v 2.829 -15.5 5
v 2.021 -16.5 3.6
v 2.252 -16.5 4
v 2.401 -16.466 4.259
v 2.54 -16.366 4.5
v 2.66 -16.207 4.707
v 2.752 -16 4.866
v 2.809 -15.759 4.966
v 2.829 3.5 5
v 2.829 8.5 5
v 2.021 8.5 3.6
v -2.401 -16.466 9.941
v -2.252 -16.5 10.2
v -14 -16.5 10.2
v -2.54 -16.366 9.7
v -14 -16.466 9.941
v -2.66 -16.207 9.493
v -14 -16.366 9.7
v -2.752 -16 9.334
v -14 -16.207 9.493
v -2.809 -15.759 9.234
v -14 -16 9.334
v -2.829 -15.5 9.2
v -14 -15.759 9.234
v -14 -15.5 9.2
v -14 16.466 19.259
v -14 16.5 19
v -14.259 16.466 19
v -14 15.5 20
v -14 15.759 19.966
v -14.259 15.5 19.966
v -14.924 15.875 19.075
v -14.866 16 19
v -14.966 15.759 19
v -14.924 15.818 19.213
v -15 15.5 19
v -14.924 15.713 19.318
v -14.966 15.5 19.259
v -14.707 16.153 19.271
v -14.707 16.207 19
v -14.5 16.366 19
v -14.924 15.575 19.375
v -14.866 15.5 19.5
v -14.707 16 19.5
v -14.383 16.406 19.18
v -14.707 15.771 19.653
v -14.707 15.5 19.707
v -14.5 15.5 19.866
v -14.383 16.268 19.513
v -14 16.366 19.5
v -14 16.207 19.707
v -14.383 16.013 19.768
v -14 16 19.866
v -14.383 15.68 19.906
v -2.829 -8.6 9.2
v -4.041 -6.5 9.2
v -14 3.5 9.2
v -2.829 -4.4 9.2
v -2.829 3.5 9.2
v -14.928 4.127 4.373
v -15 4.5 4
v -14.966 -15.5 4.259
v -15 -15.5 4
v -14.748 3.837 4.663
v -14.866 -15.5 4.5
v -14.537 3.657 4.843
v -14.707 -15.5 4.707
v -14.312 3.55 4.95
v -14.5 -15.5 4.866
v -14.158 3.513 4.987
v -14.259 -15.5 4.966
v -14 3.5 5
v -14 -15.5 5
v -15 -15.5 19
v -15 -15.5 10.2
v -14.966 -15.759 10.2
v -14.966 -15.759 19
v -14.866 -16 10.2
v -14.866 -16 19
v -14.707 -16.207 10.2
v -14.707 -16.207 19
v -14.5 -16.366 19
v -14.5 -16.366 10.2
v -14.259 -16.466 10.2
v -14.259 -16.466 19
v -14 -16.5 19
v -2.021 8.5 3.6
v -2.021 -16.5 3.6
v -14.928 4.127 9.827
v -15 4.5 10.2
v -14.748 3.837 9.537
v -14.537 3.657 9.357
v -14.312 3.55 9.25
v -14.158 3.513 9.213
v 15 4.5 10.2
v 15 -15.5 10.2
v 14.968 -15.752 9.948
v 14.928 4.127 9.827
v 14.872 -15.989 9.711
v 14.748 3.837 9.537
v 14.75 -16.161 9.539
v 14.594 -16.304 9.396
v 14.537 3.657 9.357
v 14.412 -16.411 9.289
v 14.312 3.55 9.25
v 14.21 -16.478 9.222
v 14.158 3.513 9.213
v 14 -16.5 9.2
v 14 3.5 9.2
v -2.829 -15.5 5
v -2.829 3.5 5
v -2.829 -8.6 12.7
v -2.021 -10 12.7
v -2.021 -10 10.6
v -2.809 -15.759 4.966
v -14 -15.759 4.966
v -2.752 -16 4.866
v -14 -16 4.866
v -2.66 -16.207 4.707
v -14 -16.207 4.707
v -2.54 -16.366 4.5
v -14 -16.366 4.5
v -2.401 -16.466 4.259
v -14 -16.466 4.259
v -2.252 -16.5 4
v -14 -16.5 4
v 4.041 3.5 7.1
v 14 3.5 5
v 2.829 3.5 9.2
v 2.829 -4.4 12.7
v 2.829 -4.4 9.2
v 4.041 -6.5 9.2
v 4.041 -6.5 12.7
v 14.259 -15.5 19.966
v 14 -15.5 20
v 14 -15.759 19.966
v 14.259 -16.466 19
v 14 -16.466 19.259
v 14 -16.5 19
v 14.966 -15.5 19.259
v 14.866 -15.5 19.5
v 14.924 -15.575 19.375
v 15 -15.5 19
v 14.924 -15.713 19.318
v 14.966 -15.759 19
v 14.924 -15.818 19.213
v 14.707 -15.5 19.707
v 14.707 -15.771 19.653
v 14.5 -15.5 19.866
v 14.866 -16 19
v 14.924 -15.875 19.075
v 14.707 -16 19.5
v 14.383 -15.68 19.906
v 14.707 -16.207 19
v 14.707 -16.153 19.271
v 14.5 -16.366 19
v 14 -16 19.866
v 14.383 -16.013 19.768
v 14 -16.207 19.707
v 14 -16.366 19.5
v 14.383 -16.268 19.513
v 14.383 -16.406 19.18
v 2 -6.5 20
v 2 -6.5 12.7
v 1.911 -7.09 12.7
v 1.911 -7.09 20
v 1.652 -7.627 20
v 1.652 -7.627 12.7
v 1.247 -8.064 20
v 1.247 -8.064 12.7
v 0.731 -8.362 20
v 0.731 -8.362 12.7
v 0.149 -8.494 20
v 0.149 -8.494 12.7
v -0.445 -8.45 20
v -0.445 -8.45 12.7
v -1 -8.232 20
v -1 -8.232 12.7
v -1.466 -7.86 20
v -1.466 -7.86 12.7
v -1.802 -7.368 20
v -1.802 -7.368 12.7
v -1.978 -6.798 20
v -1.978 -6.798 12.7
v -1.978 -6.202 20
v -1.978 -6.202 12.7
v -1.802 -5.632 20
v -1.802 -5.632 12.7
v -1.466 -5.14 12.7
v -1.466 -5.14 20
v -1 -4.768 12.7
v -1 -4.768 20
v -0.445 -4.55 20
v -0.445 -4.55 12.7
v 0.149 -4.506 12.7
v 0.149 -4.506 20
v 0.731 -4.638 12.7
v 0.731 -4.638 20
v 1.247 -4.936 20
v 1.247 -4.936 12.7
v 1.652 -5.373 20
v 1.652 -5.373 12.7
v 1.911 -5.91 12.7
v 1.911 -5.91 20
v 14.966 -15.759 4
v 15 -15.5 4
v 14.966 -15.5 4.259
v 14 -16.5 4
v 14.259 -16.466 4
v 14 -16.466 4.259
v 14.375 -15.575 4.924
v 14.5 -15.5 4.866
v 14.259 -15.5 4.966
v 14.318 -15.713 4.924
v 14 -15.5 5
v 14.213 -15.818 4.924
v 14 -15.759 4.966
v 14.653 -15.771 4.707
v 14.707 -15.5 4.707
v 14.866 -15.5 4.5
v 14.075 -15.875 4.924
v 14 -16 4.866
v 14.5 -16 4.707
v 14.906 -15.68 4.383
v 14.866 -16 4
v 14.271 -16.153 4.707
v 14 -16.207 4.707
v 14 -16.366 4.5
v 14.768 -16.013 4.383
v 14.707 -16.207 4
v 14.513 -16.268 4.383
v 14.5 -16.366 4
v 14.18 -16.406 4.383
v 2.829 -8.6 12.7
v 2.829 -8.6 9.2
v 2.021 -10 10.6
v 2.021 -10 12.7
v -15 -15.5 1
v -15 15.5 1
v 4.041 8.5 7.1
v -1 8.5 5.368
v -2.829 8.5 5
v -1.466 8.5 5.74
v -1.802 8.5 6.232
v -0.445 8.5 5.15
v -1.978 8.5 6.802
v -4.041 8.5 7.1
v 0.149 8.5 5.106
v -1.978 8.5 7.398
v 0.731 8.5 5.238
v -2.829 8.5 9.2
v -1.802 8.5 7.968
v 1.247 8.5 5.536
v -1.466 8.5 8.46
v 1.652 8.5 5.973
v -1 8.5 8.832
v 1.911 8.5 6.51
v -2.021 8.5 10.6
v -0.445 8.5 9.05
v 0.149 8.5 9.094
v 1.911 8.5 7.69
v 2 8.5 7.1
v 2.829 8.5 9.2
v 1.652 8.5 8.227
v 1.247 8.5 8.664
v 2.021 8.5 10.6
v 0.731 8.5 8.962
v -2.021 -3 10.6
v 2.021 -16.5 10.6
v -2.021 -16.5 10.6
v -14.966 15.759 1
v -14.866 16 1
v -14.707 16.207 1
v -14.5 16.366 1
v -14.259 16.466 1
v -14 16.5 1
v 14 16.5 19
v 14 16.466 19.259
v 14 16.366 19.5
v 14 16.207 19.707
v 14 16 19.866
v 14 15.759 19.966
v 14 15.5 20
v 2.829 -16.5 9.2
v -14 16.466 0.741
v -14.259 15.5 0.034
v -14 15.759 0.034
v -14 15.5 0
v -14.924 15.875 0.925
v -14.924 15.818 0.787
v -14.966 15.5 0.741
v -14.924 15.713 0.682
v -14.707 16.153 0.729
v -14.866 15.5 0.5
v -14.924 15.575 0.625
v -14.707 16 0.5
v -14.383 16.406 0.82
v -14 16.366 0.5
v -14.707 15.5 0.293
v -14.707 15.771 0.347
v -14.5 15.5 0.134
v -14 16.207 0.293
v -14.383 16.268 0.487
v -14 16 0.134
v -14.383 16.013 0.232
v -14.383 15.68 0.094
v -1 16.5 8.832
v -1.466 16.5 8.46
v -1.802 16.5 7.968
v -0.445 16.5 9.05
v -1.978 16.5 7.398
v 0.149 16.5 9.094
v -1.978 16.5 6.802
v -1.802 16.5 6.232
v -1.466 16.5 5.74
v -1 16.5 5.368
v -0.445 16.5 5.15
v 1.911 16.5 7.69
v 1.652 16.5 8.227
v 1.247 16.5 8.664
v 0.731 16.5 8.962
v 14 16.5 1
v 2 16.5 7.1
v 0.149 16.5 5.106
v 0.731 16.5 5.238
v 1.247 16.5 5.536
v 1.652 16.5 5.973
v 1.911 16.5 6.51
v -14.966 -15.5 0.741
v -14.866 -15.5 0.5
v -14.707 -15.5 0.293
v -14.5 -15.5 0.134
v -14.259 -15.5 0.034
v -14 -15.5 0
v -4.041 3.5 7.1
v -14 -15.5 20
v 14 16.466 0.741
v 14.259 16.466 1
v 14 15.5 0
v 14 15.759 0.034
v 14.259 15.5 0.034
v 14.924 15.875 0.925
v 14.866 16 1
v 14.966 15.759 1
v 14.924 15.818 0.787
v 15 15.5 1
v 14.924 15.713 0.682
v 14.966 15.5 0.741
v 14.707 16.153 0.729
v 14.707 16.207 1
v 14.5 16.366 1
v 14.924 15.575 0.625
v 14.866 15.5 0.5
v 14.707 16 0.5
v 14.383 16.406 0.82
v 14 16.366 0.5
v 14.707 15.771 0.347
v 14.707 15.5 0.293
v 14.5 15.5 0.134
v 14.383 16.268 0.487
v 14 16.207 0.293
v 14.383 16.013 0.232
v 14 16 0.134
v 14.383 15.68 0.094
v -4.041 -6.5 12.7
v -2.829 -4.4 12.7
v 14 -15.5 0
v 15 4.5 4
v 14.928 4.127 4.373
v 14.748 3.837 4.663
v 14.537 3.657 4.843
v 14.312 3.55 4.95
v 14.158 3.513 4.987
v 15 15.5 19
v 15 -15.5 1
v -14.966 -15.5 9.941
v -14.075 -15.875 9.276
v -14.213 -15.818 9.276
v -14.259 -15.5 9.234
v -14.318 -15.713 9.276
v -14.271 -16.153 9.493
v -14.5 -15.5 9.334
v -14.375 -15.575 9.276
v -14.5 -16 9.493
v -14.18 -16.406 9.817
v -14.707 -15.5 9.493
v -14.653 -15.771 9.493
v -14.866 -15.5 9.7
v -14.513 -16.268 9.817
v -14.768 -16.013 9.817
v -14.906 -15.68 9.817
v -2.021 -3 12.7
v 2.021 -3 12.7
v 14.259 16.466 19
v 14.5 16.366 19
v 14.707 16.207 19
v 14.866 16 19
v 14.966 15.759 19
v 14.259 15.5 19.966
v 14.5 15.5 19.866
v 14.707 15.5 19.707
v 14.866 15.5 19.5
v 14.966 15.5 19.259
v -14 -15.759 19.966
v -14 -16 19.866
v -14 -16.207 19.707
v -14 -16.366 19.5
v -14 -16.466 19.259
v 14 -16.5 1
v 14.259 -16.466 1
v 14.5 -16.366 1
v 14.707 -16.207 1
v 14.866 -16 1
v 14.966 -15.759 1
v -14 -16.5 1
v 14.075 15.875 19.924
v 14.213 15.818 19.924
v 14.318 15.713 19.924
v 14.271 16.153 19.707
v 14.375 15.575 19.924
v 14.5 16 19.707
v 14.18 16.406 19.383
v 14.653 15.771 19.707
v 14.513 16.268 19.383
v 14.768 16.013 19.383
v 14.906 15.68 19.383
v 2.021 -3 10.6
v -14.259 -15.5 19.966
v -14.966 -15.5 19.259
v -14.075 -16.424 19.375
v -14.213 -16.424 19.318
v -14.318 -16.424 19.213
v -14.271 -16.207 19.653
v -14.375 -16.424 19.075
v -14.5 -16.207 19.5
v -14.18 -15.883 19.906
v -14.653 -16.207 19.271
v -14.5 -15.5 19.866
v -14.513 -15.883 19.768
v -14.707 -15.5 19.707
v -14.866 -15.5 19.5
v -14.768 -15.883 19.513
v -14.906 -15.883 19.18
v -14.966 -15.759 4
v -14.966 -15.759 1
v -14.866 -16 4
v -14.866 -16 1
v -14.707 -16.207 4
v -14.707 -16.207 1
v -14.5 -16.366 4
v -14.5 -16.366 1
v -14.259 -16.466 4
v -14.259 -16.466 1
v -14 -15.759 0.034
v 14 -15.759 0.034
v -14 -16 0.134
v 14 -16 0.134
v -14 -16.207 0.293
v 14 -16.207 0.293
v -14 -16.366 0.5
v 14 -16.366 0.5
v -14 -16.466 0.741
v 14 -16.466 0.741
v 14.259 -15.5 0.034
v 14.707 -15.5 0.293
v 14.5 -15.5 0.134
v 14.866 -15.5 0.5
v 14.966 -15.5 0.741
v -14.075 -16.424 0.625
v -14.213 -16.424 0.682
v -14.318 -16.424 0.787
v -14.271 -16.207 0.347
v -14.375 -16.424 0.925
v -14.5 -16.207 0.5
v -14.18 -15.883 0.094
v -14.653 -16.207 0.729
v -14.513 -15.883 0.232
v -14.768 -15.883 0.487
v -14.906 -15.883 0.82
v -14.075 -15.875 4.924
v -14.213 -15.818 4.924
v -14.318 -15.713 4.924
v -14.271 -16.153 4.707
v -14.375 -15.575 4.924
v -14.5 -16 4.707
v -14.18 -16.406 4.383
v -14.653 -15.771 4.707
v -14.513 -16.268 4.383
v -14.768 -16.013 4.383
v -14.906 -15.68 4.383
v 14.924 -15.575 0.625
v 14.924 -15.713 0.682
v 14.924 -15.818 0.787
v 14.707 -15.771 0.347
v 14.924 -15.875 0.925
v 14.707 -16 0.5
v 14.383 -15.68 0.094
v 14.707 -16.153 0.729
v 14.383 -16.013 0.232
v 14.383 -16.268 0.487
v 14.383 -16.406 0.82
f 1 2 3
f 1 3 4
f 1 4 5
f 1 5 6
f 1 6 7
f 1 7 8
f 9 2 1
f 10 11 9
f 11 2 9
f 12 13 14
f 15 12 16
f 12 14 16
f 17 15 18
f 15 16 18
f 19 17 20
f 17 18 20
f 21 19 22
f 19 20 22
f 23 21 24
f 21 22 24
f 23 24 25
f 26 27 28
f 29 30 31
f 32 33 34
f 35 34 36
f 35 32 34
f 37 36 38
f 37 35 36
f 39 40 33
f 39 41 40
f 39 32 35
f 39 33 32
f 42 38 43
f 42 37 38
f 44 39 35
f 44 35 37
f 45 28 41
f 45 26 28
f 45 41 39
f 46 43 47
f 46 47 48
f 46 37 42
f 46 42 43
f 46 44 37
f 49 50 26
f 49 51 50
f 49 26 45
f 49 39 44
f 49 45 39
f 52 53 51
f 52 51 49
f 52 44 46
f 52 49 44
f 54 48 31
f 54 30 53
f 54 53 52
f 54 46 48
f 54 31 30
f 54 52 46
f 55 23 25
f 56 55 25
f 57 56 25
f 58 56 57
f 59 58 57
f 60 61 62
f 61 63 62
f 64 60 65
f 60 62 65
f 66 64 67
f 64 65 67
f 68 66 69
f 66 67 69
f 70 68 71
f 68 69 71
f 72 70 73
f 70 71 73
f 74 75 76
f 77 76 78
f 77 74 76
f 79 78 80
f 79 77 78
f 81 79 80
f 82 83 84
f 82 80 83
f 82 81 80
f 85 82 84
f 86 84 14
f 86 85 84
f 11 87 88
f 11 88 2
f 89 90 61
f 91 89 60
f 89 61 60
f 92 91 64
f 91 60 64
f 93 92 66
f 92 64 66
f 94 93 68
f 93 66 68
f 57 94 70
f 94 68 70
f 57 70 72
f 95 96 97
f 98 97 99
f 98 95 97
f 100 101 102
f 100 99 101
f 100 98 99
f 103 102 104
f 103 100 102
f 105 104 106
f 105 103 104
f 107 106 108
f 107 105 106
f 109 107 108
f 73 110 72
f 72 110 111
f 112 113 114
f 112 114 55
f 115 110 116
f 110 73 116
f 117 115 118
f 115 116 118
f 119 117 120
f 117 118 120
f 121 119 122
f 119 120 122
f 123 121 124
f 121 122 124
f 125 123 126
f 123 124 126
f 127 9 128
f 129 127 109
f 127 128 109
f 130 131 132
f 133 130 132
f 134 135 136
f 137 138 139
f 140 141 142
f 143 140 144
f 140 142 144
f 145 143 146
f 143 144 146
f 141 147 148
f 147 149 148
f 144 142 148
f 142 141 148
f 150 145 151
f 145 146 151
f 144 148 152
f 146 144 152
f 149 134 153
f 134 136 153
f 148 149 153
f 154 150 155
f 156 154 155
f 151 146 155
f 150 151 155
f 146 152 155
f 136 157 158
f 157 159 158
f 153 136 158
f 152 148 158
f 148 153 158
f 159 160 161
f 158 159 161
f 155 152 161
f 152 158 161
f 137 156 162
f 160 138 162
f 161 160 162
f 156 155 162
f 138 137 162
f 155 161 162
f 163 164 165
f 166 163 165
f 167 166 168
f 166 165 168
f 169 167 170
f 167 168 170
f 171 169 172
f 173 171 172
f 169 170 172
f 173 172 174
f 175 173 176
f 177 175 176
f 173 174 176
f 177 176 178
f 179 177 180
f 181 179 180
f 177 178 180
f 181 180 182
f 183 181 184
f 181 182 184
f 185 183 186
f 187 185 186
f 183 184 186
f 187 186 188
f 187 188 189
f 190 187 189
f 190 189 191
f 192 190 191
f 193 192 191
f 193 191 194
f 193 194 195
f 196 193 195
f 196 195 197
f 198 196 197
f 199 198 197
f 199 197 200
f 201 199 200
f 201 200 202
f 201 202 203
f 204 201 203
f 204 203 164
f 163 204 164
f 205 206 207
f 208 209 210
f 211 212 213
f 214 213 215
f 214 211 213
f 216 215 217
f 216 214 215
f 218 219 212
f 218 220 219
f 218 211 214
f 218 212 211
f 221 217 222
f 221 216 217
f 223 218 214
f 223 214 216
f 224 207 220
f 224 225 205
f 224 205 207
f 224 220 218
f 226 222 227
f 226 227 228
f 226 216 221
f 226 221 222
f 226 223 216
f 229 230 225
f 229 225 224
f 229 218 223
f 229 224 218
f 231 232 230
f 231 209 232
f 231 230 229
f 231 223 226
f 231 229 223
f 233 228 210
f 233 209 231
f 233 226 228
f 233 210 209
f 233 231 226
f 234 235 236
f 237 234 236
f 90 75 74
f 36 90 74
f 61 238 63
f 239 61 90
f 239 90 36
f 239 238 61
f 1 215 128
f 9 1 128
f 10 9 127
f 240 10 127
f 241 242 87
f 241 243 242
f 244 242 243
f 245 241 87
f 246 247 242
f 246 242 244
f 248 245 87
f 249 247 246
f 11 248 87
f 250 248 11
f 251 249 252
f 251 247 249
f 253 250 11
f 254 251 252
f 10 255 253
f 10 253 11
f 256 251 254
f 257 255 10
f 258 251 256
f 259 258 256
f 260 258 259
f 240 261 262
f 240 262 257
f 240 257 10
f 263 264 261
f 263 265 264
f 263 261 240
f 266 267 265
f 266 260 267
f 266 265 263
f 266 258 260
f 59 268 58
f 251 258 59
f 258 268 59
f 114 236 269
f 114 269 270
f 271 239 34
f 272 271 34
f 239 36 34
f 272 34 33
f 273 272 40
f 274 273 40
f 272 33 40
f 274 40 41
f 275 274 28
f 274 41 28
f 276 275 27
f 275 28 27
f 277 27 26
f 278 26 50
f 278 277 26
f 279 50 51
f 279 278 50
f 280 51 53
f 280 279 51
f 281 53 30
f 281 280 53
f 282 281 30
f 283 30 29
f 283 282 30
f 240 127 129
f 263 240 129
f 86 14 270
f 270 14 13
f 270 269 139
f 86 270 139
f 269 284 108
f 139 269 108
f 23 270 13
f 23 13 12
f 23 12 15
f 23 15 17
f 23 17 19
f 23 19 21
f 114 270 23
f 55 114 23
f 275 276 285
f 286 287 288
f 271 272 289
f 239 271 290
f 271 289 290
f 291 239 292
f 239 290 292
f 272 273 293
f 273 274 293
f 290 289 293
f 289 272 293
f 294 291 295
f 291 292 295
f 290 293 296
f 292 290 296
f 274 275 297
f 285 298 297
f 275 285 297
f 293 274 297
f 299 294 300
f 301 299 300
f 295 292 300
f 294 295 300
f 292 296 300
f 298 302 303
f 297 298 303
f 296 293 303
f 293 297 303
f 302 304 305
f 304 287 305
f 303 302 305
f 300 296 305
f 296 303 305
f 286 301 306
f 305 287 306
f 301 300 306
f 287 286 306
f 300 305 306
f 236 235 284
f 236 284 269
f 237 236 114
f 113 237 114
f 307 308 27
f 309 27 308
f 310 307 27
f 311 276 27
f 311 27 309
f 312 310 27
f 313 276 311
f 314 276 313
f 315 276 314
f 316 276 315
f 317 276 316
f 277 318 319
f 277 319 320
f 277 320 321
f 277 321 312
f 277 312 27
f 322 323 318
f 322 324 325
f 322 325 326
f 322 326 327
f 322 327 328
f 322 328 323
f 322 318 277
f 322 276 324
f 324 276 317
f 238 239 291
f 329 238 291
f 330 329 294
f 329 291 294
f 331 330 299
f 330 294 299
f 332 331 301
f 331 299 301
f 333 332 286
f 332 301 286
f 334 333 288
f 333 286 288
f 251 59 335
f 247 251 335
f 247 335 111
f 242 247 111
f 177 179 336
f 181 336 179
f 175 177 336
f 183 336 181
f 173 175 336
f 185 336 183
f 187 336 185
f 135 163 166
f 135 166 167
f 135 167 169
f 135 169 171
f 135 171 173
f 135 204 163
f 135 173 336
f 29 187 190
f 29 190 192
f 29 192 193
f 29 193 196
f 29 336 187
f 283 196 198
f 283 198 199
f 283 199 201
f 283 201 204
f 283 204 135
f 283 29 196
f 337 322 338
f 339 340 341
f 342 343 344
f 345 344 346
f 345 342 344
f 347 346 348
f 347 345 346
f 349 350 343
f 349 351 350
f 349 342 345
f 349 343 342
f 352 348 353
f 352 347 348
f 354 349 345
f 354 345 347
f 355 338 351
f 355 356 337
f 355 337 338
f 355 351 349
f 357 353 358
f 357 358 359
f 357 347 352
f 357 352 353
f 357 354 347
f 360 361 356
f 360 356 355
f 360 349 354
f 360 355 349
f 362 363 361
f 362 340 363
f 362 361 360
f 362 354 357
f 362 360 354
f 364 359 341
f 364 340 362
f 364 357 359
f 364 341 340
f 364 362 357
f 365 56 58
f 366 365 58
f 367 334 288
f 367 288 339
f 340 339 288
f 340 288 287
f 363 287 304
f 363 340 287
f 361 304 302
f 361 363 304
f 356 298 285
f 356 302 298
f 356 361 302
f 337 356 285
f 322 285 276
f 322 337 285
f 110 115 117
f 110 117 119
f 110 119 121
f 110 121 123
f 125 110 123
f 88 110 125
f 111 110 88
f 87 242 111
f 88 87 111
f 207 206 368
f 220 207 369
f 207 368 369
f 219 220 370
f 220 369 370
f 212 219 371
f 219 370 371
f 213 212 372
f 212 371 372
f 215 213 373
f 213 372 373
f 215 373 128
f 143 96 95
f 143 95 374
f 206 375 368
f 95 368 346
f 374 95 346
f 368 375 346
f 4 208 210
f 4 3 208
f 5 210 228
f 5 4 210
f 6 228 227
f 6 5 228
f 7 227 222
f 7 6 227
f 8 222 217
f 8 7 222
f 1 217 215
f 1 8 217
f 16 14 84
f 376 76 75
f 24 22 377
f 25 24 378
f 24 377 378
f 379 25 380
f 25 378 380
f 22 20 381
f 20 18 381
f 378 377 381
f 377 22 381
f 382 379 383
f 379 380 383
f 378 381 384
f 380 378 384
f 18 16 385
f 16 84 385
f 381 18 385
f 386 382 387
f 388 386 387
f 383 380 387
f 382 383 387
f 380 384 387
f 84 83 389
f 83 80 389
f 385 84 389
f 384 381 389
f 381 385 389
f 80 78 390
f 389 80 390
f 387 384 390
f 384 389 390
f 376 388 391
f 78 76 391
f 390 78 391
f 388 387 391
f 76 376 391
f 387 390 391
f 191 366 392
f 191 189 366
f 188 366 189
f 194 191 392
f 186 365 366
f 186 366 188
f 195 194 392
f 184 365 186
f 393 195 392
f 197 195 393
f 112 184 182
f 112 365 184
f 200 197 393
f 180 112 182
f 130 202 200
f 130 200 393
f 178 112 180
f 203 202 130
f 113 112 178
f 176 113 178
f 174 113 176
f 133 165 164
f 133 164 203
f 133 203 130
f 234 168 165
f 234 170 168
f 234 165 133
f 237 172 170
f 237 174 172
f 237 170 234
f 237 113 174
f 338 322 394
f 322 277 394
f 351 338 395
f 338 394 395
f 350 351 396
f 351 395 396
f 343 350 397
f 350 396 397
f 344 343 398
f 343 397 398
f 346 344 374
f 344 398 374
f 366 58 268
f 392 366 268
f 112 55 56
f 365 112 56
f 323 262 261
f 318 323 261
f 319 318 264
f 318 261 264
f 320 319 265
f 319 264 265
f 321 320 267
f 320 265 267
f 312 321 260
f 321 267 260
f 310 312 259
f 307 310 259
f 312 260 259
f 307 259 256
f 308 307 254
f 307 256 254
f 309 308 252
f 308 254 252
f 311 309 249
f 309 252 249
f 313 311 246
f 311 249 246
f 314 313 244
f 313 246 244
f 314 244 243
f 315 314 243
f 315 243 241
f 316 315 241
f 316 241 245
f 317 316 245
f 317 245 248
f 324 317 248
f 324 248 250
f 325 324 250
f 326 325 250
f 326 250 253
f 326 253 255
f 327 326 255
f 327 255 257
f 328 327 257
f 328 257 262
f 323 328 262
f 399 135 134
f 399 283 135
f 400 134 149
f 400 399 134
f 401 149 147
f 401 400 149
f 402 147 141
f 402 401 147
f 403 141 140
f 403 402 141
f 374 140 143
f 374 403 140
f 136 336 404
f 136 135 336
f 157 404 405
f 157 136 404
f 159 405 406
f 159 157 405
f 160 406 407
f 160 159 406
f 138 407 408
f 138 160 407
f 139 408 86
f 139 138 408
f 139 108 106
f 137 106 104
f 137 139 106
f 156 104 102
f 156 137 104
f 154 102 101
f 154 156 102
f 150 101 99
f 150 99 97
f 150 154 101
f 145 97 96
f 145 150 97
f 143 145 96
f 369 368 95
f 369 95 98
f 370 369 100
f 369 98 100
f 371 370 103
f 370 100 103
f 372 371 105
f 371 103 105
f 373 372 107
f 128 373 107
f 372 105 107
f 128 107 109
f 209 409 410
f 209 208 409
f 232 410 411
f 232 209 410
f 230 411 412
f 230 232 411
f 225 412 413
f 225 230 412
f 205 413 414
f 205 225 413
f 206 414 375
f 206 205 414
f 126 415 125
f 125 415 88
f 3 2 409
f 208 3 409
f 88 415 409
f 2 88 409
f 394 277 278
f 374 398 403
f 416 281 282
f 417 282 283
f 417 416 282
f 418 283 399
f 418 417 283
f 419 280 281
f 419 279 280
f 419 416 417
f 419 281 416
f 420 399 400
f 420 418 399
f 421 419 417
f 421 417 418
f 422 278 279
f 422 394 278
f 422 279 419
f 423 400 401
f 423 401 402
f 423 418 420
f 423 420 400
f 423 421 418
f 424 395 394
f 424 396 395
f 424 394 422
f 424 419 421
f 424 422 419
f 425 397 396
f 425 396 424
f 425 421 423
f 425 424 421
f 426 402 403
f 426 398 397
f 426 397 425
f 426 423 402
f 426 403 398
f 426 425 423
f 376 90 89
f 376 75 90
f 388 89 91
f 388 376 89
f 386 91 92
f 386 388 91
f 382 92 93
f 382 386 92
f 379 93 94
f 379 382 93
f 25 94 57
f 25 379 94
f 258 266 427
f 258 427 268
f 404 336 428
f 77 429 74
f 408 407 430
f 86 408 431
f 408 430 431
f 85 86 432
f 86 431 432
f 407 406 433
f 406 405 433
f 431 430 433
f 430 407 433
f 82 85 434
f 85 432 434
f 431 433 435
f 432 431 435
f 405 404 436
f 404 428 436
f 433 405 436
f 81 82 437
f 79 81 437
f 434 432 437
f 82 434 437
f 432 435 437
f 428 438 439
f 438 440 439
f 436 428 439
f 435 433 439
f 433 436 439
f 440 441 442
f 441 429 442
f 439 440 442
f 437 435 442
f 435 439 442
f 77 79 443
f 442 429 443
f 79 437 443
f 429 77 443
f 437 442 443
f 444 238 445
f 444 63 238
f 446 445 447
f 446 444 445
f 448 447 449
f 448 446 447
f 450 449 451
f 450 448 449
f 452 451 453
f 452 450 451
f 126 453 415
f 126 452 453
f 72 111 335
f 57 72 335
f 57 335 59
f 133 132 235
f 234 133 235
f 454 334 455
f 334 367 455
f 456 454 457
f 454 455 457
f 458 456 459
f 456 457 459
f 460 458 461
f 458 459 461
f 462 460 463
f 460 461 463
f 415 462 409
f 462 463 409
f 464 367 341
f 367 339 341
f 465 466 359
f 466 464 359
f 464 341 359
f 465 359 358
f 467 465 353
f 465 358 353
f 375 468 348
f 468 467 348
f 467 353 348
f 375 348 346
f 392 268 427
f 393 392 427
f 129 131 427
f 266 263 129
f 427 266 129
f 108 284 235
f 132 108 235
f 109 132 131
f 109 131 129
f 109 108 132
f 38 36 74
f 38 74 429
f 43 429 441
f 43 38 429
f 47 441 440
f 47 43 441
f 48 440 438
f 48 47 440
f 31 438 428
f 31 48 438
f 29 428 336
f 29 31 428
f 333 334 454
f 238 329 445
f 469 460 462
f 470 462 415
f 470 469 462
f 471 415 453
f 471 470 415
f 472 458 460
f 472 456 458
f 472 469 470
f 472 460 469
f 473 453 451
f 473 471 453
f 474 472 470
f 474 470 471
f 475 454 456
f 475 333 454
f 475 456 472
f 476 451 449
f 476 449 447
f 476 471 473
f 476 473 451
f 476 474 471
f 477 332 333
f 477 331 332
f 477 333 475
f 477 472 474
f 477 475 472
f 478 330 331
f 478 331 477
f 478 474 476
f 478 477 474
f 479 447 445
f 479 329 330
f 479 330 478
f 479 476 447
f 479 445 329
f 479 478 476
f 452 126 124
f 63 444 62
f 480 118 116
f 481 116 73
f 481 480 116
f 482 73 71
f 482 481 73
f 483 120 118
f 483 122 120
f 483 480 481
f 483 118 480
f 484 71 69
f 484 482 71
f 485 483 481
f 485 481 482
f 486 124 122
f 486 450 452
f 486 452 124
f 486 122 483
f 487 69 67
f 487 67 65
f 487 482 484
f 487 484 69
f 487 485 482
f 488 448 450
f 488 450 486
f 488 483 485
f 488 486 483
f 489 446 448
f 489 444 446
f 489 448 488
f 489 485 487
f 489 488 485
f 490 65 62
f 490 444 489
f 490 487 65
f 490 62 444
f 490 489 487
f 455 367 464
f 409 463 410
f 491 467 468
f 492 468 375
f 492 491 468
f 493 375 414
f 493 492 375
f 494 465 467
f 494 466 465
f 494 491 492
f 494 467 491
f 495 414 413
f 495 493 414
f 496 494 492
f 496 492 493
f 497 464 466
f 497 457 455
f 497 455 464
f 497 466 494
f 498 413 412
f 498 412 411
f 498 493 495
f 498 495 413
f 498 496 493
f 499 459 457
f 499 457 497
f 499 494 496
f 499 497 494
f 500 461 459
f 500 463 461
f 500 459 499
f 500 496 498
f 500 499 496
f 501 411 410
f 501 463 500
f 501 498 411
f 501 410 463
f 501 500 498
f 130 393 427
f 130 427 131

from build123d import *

# Parameters (mm, degrees)
F0_W          = 30
F0_H          = 33
F1_DEPTH      = 20
F2_W          = 20
F2_H          = 4.2
F3_DEPTH      = 30.001
F4_R          = 2
F5_DEPTH      = 5
F5_DEPTH_BACK = 20.001
F6_DEPTH      = 13.001
F7_R          = 2
F8_DEPTH      = 10.801
F9_DEPTH      = 3.5
F10_R         = 1


with BuildPart() as f1:
    # F0 (on Top) → F1 (new body)
    with BuildSketch(Plane.XY):
        Rectangle(F0_W, F0_H)
    extrude(amount=F1_DEPTH)

    # F2 (on face) → F3 (cut, through all)
    with BuildSketch(Plane.YZ.offset(15)):
        with Locations((-6.5, 7.1)):
            Rectangle(F2_W, F2_H)
    extrude(amount=-F3_DEPTH, mode=Mode.SUBTRACT)

    # F4 (on face) → F5 (cut, two sides)
    with BuildSketch(Plane.XZ.offset(-3.5)) as f5_sk:
        Polygon((-2.829016319, 9.2), (2.829016319, 9.2), (2.0207259422, 10.6), (-2.0207259422, 10.6), align=None)
        Polygon((-2.829016319, 5), (2.829016319, 5), (4.0414518843, 7.1), (2.829016319, 9.2), (-2.829016319, 9.2), (-4.0414518843, 7.1), align=None)
        with Locations((0, 7.1)):
            Circle(F4_R, mode=Mode.SUBTRACT)
        Polygon((-2.0207259422, 3.6), (2.0207259422, 3.6), (2.829016319, 5), (-2.829016319, 5), align=None)
    extrude(amount=-F5_DEPTH, mode=Mode.SUBTRACT)
    extrude(f5_sk.sketch, amount=F5_DEPTH_BACK, mode=Mode.SUBTRACT)

    # F6 (cut, through all): a face of the model
    f6_faces = [f1.faces().sort_by_distance(p)[0] for p in [
        (0, 3.5, 7.1),
    ]]
    extrude(f6_faces, amount=-F6_DEPTH, mode=Mode.SUBTRACT)

    # F7 (on face) → F8 (cut, through all)
    with BuildSketch(Plane(origin=(0, 0, 9.2), x_dir=(1, 0, 0), z_dir=(0, 0, -1))):
        with Locations((0, 6.5)):
            Circle(F7_R)
    extrude(amount=-F8_DEPTH, mode=Mode.SUBTRACT)

    # F7 (on face) → F9 (cut)
    with BuildSketch(Plane(origin=(0, 0, 9.2), x_dir=(1, 0, 0), z_dir=(0, 0, -1))):
        Polygon((-4.0414518843, 6.5), (-2.829016319, 4.4), (-2.829016319, 8.6), align=None)
        Polygon((-2.829016319, 8.6), (-2.829016319, 4.4), (-2.0207259422, 3), (2.0207259422, 3), (2.829016319, 4.4), (2.829016319, 8.6), (2.0207259422, 10), (-2.0207259422, 10), align=None)
        with Locations((0, 6.5)):
            Circle(F7_R, mode=Mode.SUBTRACT)
        Polygon((2.829016319, 8.6), (2.829016319, 4.4), (4.0414518843, 6.5), align=None)
    extrude(amount=-F9_DEPTH, mode=Mode.SUBTRACT)

    # F10
    f10_edges = [f1.edges().sort_by_distance(p)[0] for p in [
        (0, 16.5, 0),
        (15, 16.5, 10),
        (0, 16.5, 20),
        (-15, 16.5, 10),
        (-15, 0, 0),
        (0, -16.5, 0),
        (15, 0, 0),
        (-15, 0, 20),
        (0, -16.5, 20),
        (15, 0, 20),
        (-15, -16.5, 2.5),
        (-15, -16.5, 14.6),
        (15, -16.5, 2.5),
        (15, -16.5, 14.6),
        (15, -6.5, 9.2),
        (15, -6.5, 5),
        (8.914508, -16.5, 5),
        (-8.914508, -16.5, 5),
        (-8.914508, -16.5, 9.2),
        (-15, 3.5, 7.1),
        (-15, -6.5, 5),
        (-15, -6.5, 9.2),
        (15, 3.5, 7.1),
    ]]
    fillet(f10_edges, radius=F10_R)


solid = f1.part
